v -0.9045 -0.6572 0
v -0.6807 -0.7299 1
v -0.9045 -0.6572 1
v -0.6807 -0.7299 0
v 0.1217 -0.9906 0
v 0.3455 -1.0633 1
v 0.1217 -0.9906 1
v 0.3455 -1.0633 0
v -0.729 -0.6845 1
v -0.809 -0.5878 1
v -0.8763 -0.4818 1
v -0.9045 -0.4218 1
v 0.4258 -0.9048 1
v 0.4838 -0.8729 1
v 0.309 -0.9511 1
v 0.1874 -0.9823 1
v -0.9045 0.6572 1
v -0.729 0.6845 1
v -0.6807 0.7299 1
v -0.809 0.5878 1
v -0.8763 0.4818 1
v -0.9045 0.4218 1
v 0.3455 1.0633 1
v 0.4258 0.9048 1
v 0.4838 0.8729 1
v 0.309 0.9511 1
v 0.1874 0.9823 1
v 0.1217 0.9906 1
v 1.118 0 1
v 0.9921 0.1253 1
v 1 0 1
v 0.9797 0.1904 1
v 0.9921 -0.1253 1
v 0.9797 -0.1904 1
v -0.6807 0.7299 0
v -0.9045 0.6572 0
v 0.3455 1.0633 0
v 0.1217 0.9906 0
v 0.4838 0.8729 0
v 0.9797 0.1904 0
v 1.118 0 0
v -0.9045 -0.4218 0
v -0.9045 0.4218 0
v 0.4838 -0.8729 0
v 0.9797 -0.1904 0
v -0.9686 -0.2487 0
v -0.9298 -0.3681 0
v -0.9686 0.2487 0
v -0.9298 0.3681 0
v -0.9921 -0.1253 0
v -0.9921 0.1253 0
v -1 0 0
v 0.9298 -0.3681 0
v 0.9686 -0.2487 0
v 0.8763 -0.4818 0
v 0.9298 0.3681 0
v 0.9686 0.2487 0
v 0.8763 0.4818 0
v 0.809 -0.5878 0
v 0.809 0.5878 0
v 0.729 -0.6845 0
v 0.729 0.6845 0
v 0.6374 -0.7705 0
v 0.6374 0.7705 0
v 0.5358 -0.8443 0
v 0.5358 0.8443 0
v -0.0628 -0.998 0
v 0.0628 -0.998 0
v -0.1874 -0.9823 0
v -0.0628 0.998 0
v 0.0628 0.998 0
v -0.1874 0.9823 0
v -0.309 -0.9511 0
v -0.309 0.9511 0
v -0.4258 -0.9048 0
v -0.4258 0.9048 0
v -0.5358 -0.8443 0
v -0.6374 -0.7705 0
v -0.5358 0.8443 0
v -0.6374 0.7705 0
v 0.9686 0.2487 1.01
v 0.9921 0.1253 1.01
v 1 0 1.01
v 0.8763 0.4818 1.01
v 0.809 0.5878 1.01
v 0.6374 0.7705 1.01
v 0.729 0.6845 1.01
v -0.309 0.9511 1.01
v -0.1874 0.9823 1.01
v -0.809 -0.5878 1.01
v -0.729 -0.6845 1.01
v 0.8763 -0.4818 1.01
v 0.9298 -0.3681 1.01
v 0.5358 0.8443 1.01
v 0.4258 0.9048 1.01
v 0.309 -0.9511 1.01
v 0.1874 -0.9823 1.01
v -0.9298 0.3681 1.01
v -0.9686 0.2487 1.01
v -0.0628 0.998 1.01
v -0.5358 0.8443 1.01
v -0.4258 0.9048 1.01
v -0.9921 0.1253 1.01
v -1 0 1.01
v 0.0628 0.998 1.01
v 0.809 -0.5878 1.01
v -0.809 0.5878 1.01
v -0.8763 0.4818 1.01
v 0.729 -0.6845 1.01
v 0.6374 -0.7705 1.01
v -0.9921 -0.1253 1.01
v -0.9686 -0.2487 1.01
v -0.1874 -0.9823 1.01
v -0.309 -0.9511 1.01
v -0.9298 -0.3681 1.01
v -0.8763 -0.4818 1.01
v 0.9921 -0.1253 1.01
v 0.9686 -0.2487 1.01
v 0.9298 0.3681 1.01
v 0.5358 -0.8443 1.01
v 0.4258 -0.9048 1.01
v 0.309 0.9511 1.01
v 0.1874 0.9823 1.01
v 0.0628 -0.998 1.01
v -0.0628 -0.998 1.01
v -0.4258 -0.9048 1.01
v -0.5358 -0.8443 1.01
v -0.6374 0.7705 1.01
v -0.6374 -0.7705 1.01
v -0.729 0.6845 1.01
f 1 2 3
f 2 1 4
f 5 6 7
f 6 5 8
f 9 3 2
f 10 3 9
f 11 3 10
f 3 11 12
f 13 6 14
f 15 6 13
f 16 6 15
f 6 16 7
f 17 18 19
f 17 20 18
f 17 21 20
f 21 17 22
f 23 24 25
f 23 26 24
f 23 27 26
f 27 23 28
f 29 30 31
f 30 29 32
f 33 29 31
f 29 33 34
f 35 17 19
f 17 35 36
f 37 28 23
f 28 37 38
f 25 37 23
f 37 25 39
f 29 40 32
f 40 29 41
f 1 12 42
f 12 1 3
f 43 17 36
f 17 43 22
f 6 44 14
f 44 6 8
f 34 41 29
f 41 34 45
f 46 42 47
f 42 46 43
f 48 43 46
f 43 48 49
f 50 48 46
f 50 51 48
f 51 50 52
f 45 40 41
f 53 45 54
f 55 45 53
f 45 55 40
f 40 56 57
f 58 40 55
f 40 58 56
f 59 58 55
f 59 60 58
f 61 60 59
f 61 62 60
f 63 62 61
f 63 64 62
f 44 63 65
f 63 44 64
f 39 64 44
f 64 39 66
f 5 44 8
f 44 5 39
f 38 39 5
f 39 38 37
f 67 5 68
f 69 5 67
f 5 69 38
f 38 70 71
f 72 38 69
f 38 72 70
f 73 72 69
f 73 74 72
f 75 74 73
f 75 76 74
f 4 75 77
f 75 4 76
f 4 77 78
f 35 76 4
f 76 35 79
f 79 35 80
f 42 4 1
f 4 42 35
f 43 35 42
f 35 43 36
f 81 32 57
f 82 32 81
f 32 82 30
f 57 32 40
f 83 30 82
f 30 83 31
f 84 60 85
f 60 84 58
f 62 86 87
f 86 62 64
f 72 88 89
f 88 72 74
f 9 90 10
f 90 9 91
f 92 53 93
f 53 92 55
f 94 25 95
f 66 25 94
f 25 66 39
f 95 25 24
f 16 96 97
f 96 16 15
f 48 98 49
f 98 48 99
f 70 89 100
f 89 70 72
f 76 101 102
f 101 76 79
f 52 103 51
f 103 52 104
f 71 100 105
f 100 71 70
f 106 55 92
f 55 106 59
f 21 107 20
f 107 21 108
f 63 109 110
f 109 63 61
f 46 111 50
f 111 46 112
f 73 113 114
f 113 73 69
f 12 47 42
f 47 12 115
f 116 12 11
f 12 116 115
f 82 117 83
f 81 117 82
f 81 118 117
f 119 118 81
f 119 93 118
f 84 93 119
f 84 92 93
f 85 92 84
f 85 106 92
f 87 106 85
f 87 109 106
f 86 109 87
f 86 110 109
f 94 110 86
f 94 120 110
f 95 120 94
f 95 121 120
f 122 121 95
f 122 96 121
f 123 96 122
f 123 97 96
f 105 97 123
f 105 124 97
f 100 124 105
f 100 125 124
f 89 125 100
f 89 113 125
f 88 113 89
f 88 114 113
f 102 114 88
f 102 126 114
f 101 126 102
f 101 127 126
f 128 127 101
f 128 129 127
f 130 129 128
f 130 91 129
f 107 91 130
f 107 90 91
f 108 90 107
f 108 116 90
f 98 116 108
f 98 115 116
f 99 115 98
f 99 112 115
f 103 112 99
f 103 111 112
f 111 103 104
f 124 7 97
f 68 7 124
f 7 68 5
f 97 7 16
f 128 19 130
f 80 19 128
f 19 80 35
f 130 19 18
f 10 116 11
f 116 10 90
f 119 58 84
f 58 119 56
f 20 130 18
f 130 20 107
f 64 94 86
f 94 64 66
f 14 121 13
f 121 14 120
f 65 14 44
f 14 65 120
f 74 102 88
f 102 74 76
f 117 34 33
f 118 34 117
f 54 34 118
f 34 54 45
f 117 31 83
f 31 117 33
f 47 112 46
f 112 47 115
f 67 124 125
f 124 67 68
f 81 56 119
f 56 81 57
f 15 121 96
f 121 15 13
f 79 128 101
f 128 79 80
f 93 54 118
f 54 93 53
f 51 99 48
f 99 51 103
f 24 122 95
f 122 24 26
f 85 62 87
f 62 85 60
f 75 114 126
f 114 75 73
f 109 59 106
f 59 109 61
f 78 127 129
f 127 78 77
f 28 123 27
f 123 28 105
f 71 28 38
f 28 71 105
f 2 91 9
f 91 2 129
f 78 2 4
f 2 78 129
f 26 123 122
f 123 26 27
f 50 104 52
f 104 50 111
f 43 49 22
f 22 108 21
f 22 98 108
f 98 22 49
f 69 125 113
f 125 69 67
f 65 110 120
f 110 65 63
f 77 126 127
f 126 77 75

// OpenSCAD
// file: get_fragments_from_r.scad
GRID_FINE = 0.000001;
M_PI = 3.14159;

/*	Returns the number of subdivision of a whole circle, given radius and
	the three special variables $fn, $fs and $fa
*/
function get_fragments_from_r(r, fn, fs, fa) =
    r < GRID_FINE ? 3
    : fn > 0 ? (fn >= 3 ? floor(fn) : 3)
    : ceil(max(min(360.0 / fa, r*2*M_PI / fs), 5));
// main file
use <get_fragments_from_r.scad>

color("yellow") cylinder_mid(1, 1);
color("blue", 0.5) cylinder(1.01, 1, 1, $fn=50);

module cylinder_mid(height, radius)
{
   fn = get_fragments_from_r(radius, $fn, $fs, $fa);
   fudge = (1+1/cos(180/fn))/2;
   cylinder(h=height,r=radius*fudge,$fn=fn);
}
